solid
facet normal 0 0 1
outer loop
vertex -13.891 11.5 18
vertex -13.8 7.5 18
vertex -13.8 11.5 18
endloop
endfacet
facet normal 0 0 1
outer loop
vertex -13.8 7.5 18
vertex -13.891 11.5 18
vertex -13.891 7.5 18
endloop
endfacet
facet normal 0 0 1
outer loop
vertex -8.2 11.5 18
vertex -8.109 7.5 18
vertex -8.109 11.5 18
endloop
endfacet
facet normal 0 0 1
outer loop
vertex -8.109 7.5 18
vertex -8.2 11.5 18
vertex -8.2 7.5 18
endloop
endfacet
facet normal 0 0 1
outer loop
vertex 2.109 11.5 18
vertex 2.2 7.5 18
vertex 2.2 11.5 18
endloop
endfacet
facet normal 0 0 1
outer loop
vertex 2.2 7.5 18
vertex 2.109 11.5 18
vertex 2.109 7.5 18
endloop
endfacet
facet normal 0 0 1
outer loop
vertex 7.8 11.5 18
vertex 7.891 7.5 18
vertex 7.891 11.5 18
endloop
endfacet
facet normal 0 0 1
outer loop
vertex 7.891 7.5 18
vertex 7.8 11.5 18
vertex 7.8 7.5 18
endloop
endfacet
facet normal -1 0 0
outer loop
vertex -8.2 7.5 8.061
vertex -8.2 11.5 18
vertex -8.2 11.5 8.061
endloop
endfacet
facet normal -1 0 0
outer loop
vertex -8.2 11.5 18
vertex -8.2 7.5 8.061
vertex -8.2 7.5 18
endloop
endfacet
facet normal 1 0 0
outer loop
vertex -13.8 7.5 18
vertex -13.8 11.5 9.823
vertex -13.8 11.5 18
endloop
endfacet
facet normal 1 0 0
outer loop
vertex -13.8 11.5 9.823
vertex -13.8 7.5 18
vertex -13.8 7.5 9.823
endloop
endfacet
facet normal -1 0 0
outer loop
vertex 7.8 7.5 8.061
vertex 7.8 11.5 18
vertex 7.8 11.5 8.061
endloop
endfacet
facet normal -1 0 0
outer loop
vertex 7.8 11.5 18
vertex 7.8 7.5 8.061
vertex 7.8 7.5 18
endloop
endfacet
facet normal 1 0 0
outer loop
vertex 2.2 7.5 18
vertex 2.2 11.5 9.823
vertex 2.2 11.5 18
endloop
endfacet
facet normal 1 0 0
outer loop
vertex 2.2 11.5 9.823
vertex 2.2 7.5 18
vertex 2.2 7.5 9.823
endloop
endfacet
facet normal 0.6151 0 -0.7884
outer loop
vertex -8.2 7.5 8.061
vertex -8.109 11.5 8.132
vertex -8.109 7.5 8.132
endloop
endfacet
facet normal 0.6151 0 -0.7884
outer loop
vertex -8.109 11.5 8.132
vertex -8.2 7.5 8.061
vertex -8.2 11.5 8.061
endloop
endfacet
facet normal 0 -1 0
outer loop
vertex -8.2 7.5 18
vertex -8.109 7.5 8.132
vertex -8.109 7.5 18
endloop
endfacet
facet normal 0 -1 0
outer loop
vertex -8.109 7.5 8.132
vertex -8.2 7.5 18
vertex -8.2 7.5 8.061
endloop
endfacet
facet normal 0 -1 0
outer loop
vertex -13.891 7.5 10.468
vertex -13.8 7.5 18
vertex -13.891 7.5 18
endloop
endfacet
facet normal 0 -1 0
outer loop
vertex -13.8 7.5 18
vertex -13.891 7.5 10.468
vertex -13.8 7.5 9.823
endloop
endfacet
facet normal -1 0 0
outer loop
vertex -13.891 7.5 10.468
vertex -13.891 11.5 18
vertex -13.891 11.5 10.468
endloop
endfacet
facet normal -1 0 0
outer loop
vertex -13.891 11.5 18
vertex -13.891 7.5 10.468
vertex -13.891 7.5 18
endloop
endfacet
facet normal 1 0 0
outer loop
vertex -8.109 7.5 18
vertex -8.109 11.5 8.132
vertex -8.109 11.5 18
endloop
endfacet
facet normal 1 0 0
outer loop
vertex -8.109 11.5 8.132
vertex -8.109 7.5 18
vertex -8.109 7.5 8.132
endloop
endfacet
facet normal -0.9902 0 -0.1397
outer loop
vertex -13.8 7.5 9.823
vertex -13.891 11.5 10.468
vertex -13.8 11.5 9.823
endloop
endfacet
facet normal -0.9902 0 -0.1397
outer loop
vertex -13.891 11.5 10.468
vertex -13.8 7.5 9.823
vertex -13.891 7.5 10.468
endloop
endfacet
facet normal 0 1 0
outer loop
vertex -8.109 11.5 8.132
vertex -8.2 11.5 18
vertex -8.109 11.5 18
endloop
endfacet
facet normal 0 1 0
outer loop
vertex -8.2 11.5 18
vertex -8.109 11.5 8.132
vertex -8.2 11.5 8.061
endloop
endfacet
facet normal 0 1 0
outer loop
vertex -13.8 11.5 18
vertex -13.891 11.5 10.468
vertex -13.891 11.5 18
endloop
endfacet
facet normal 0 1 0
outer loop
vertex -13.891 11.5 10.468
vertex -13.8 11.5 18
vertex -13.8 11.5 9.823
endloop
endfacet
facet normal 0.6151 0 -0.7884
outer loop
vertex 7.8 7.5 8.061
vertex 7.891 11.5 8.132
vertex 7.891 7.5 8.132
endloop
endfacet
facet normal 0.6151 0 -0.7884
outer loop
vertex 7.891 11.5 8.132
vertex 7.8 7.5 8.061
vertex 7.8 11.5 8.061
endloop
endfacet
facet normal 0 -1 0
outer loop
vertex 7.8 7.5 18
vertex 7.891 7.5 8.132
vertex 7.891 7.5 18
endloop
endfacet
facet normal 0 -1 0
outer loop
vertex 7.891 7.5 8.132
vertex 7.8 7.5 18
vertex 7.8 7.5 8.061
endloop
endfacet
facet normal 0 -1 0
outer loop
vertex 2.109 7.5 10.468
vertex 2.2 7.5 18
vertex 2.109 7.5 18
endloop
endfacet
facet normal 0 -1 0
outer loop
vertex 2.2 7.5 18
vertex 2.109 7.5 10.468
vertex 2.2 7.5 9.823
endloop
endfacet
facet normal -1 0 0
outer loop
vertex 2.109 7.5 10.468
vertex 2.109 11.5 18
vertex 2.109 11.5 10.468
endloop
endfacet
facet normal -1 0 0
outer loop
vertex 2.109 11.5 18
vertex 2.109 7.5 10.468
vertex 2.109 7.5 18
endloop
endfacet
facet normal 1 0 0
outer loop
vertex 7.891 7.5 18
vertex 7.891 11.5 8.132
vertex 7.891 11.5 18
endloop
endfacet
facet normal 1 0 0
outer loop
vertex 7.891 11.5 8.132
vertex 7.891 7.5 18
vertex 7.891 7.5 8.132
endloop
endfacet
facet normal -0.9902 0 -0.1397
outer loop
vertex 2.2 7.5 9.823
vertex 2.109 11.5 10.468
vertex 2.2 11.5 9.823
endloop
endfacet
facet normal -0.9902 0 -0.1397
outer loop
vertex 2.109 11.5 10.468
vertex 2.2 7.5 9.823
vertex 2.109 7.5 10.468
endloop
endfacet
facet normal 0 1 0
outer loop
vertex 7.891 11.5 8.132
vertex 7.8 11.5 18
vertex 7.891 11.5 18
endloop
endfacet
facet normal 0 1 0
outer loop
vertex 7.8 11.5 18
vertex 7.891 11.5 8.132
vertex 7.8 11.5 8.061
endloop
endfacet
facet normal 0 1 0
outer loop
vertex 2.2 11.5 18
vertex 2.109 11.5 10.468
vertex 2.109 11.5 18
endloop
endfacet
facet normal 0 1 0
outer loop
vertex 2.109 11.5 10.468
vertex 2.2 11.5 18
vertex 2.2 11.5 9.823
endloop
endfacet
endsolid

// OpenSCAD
// The front X lock nut must not be able to spin in its pocket. A real nut
// (5.5 AF) turned 8 deg from its seated orientation, swept from the screw
// axis up through the open drop-in slot, must hit the pocket walls.
// Must render NON-empty.
include <../stage.scad>
af = 5.4;
d = af / cos(30);
z = stage_base_h + xs_lock_z;
intersection() {
  stage_x_slider();
  for (fx = [-8, 8]) hull() for (dz = [0, xs_h])
    translate([xs_xc + fx, -xs_back_nut_y, z + dz]) rotate([90, 0, 0]) rotate([0, 0, 90 + 8])
      cylinder(d = d, h = 4, center = true, $fn = 6);
}
